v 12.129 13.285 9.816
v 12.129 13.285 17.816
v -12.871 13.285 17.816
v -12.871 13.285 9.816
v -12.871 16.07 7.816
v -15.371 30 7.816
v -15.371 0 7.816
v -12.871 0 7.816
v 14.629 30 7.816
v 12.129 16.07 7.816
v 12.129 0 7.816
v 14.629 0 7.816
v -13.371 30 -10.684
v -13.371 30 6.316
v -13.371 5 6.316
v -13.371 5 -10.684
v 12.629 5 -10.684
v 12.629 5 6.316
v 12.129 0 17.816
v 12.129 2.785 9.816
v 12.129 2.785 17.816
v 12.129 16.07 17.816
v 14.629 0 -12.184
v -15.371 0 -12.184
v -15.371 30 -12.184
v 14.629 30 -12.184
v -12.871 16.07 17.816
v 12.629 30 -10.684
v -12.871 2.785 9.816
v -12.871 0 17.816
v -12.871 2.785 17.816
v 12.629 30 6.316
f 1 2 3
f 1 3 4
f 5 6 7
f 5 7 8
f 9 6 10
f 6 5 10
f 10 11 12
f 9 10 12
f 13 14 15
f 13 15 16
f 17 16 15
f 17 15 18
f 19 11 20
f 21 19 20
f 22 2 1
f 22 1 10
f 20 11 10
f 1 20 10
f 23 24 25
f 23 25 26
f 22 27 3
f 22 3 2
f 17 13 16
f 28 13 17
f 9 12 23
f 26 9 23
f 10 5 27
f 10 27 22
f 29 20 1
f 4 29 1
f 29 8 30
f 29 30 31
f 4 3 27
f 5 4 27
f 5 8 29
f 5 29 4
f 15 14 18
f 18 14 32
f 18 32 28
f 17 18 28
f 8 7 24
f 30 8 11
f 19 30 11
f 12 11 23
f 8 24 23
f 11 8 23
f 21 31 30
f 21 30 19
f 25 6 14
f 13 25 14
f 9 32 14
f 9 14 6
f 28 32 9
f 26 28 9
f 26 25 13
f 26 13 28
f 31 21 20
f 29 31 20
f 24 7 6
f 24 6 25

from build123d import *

# Parameters (mm, degrees)
SKETCH_1_W          = 30
SKETCH_1_H          = 20
EXTRUDE_1_DEPTH     = 30
SKETCH_2_W          = 26
SKETCH_2_H          = 17
CUT_EXTRUDE_2_DEPTH = 25
SKETCH_3_W          = 25
SKETCH_3_H          = 16.07
EXTRUDE_2_DEPTH     = 10
SKETCH_4_W          = 8
SKETCH_4_H          = 10.5
CUT_EXTRUDE_3_DEPTH = 45.426074479


with BuildPart() as part:
    # 草图1 → 凸台-拉伸1 (new body)
    with BuildSketch(Plane(origin=(0, 0, 0), x_dir=(1, 0, 0), z_dir=(0, 1, 0))):
        with Locations((-0.371492922, 2.183544304)):
            Rectangle(SKETCH_1_W, SKETCH_1_H)
    extrude(amount=EXTRUDE_1_DEPTH)

    # 草图2 → 切除-拉伸2 (cut)
    with BuildSketch(Plane(origin=(0, 30, 0), x_dir=(1, 0, 0), z_dir=(0, 1, 0))):
        with Locations((-0.371492922, 2.183544304)):
            Rectangle(SKETCH_2_W, SKETCH_2_H)
    extrude(amount=-CUT_EXTRUDE_2_DEPTH, mode=Mode.SUBTRACT)

    # 草图3 → 凸台-拉伸2 (add)
    with BuildSketch(Plane.XY.offset(7.816455696)):
        with Locations((-0.371492922, 8.035)):
            Rectangle(SKETCH_3_W, SKETCH_3_H)
    extrude(amount=EXTRUDE_2_DEPTH)

    # 草图4 → 切除-拉伸3 (cut, through all)
    with BuildSketch(Plane(origin=(12.128507078, 0, 0), x_dir=(0, 0, -1), z_dir=(1, 0, 0))):
        with Locations((-13.816455696, 8.035)):
            Rectangle(SKETCH_4_W, SKETCH_4_H)
    extrude(amount=-CUT_EXTRUDE_3_DEPTH, mode=Mode.SUBTRACT)


solid = part.part
